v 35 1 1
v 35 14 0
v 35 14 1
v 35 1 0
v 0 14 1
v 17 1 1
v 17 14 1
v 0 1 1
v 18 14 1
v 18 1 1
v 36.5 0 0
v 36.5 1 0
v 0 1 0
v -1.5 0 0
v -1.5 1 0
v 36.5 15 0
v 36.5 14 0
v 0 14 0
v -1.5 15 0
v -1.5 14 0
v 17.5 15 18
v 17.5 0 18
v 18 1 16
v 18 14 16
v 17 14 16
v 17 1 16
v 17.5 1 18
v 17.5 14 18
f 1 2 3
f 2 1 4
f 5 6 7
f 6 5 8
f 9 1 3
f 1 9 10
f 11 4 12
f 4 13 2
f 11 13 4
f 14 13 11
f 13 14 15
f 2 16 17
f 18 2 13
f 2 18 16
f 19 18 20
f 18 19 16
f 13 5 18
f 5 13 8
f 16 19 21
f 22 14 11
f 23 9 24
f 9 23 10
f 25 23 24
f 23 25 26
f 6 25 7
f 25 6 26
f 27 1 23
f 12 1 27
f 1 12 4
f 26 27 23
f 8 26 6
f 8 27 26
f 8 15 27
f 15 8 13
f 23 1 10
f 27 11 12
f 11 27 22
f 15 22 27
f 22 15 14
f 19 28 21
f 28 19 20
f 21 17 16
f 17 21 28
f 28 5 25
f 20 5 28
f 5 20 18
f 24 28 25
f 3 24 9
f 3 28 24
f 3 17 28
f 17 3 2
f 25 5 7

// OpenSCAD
module Arrow(length, width, angle, height=10, heights=undef, center=undef, centerXYZ=[true, false, false]) {
    //Calcluate the angle
    triangleAngle = (angle!=undef) ? angle : atan(length / (width/2));
	
    //Calcute the length
    triangleLength = (width==undef) ? (length/sin((180-(angle*2))/2)) : (width / cos(triangleAngle))/2;
	
    //Calculate the width
    triangleWidth = (width==undef) ? (cos(angle)*triangleLength)*2:width;
    
	// Calculate Heights at each point
	heightAB = ((heights==undef) ? height : heights[0])/2;
	heightBC = ((heights==undef) ? height : heights[1])/2;
	heightCA = ((heights==undef) ? height : heights[2])/2;
	centerZ = (center || (center==undef && centerXYZ[2])) ? 0 : max(heightAB, heightBC, heightCA);

	// Calculate Offsets for centering
	offsetX = (center || (center==undef && centerXYZ[0])) ? ((cos(triangleAngle) * triangleLength) + triangleWidth) / 3:0;
	offsetY = (center || (center==undef && centerXYZ[1])) ? (sin(triangleAngle) * triangleLength) / 3:0;	
    
    //Calculate the points
	pointAB1 = [-offsetX, -offsetY, centerZ - heightAB];
	pointAB2 = [-offsetX, -offsetY, centerZ + heightAB];
	pointBC1 = [triangleWidth - offsetX, -offsetY, centerZ - heightBC];
	pointBC2 = [triangleWidth - offsetX, -offsetY, centerZ + heightBC];
	pointCA1 = [(cos(triangleAngle) * triangleLength) - offsetX,(sin(triangleAngle) * triangleLength) - offsetY, centerZ - heightCA];
	pointCA2 = [(cos(triangleAngle) * triangleLength) - offsetX,(sin(triangleAngle) * triangleLength) - offsetY, centerZ + heightCA];

    //Set the triangle points
    trianglePoints = [
        pointAB1, 
        pointBC1, 
        pointCA1,
        pointAB2, 
        pointBC2, 
        pointCA2
    ];
    
    //Set the triangle faces
    triangleFaces = [
        [0, 1, 2],
        [3, 5, 4],
        [0, 3, 1],
        [1, 3, 4],
        [1, 4, 2],
        [2, 4, 5],
        [2, 5, 0],
        [0, 5, 3]
    ];
	polyhedron(trianglePoints, triangleFaces);
}

module wipwap(width=35, height=15, depth=10, wall=1) {

    cube([width, height, wall]);
    translate([width/2-wall/2, 0, wall])
        cube([wall, height, height]);
    
    translate([width/2, wall, 0])
    rotate([90, 0, 0])
        Arrow(width = width+wall*3, length = height+wall*3, height=wall);
    
    translate([width/2, height, 0])
    rotate([90, 0, 0])
        Arrow(width = width+wall*3, length = height+wall*3, height=wall);
    
}


wipwap();
